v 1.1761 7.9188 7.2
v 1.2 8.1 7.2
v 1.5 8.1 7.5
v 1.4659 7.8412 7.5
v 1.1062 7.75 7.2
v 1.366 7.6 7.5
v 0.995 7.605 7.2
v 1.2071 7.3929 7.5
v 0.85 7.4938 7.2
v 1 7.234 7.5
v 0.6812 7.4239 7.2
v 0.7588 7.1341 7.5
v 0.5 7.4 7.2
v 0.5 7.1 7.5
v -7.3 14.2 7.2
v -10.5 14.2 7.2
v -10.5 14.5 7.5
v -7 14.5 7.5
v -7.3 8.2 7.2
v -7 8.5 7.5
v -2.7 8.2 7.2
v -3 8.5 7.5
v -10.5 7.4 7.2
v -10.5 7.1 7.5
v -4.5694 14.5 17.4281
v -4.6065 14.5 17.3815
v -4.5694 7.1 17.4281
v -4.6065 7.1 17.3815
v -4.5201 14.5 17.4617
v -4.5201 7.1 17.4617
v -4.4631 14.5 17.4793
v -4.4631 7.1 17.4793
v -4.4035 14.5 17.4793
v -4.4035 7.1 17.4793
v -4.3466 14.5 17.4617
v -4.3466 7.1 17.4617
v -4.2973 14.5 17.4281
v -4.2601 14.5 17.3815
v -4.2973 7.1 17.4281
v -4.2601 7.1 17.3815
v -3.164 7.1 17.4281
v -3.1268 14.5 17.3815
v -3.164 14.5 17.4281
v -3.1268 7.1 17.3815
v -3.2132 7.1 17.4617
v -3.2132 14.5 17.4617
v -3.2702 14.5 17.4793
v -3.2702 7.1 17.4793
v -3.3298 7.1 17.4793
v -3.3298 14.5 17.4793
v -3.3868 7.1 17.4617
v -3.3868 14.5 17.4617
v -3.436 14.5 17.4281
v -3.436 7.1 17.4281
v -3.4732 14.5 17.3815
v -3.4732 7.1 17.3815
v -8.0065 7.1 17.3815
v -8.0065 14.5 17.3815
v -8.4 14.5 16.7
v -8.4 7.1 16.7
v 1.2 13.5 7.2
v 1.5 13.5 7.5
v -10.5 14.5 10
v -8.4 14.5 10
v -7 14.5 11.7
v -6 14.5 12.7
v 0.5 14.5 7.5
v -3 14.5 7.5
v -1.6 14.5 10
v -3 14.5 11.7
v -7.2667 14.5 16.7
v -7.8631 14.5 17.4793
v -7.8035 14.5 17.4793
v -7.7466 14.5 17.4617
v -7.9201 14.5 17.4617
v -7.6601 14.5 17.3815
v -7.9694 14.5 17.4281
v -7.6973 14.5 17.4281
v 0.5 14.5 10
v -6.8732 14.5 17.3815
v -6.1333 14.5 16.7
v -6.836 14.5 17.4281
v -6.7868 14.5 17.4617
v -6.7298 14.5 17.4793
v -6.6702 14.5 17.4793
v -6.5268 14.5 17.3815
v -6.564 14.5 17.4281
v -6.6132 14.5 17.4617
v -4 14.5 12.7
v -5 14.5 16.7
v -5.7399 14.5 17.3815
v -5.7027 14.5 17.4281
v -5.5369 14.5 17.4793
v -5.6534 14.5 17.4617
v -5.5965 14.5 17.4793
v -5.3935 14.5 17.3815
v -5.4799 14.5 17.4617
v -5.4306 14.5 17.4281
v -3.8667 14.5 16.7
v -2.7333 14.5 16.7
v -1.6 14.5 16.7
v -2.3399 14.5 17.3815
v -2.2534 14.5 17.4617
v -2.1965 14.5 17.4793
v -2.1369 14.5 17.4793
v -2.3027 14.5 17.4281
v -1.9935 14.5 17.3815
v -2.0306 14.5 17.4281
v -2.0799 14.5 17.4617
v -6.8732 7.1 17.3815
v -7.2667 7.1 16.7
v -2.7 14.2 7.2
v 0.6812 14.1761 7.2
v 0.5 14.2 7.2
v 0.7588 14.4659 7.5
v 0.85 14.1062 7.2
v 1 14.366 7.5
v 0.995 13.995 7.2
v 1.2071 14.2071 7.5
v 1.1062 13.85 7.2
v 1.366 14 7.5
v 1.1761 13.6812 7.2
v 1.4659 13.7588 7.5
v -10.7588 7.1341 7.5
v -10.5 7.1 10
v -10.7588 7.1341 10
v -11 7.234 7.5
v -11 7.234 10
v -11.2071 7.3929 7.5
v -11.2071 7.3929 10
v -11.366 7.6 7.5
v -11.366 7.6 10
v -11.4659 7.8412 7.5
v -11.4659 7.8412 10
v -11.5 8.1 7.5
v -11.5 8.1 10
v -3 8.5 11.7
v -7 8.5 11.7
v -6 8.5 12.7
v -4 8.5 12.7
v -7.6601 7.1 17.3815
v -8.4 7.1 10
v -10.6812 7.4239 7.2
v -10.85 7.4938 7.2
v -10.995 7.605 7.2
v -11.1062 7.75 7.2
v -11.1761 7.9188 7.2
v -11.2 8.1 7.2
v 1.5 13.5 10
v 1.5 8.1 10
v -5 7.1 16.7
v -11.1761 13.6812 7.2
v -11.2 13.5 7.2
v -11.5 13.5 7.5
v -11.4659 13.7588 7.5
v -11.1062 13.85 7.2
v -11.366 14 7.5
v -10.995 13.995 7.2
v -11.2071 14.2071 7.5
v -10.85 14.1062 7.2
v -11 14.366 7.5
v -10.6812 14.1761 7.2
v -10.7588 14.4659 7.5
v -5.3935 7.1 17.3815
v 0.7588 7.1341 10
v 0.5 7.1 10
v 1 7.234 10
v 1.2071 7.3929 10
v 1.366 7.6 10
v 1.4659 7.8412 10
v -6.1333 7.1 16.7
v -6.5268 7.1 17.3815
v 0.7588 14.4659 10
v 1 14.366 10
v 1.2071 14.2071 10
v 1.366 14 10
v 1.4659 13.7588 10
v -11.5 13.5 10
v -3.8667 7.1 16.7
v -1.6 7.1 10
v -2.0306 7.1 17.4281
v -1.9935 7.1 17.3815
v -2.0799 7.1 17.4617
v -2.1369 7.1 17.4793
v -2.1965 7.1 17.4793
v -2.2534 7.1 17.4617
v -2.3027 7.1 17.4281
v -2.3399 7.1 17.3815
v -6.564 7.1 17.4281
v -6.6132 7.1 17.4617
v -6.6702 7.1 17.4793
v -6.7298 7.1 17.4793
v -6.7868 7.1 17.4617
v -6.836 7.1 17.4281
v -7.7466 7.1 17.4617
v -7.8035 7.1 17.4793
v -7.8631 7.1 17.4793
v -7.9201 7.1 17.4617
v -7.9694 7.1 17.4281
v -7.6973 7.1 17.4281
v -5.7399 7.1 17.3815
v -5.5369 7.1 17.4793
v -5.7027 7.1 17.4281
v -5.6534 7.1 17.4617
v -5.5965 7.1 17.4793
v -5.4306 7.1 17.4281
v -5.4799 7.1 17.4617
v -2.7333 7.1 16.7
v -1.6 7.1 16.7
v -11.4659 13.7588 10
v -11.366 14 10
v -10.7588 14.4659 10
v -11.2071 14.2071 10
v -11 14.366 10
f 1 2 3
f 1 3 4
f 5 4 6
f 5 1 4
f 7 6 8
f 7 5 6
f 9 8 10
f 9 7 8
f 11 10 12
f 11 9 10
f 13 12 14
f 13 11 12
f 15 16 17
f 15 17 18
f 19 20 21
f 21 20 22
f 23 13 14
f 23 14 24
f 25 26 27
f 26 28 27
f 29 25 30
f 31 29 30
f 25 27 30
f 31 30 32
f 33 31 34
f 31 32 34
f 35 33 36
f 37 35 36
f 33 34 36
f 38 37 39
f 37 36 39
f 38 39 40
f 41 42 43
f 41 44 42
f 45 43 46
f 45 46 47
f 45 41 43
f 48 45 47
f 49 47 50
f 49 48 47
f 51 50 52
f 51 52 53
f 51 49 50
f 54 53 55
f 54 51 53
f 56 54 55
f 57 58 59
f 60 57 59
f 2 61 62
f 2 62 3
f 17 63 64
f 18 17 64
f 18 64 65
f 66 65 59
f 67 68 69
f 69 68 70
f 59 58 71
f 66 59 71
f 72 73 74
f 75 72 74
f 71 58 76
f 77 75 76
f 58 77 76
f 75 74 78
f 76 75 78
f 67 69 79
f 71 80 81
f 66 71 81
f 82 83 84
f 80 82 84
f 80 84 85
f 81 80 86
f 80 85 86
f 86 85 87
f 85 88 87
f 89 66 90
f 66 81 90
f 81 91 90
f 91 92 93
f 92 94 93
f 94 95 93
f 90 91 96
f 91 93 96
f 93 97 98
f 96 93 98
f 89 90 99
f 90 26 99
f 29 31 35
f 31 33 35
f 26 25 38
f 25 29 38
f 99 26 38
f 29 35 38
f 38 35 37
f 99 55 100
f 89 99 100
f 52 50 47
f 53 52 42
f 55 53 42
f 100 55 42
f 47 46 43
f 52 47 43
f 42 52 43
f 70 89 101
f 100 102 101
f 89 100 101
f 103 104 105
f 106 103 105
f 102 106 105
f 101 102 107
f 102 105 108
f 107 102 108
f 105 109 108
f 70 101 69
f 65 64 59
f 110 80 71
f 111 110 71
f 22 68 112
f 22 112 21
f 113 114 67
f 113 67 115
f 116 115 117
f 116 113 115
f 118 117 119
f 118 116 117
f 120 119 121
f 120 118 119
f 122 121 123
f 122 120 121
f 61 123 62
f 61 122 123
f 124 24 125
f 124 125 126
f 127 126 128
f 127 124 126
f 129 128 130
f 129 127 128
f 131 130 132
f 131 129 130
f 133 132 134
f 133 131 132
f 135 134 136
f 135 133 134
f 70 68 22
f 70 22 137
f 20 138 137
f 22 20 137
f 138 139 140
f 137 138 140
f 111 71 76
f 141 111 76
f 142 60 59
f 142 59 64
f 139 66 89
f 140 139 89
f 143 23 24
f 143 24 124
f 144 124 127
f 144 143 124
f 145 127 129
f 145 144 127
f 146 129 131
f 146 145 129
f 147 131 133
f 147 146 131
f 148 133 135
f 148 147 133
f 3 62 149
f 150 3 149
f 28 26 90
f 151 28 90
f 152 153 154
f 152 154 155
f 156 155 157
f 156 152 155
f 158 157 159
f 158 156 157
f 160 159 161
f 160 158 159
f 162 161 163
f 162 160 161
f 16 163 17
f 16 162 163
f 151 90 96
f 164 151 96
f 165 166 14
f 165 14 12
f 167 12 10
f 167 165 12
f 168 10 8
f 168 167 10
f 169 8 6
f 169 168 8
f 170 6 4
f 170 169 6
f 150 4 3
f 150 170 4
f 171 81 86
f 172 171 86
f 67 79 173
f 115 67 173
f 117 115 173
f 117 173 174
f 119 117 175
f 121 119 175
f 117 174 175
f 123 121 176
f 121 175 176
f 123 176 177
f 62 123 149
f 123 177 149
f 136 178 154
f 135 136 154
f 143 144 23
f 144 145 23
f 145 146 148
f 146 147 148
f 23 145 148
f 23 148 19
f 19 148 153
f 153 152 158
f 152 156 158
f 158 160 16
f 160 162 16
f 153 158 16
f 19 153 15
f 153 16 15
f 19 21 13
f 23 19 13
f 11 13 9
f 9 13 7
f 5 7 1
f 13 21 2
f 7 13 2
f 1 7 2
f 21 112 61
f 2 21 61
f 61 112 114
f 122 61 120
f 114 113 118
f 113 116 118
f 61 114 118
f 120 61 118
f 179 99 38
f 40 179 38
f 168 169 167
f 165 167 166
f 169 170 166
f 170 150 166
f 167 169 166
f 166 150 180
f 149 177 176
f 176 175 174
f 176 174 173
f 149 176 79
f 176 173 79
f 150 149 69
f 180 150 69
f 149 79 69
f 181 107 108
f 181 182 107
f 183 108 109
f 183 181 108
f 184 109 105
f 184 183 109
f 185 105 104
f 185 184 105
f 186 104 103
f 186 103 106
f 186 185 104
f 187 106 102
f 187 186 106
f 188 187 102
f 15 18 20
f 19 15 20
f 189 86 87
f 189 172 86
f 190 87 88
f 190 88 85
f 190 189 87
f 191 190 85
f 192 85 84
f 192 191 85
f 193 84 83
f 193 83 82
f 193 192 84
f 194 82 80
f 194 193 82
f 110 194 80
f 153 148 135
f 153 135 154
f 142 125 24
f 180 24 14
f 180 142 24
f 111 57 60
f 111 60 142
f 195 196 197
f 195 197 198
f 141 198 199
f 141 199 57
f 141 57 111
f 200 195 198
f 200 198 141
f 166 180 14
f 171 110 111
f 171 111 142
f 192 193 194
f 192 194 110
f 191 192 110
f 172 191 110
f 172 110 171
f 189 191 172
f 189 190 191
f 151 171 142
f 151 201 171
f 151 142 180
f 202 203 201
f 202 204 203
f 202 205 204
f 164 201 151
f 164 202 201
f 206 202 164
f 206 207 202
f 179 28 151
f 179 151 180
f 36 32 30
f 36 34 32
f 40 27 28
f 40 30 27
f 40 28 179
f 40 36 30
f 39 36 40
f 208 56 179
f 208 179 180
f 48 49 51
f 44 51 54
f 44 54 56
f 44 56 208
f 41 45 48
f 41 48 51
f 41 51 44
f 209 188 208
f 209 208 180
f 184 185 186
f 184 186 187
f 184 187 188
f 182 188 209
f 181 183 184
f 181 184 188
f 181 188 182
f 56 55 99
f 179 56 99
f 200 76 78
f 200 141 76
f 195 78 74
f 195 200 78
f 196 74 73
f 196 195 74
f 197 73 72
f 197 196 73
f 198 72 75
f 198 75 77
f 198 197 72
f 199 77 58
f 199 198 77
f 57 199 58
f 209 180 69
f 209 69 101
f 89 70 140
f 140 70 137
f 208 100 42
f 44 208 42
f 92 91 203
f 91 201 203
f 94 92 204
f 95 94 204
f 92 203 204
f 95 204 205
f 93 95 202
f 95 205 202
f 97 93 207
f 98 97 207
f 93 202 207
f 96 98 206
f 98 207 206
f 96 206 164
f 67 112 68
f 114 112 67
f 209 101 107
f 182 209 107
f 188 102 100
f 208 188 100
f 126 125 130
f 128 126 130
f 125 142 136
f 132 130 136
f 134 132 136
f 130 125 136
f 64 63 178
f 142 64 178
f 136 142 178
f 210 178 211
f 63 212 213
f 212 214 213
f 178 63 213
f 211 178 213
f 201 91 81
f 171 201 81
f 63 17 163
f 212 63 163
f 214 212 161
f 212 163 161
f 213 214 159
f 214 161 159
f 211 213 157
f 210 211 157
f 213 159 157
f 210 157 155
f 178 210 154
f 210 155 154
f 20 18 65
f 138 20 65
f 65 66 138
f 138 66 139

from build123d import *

# Parameters (mm, degrees)
PAD_DEPTH           = 7.4
SKETCH095_W         = 4
SKETCH095_H         = 5.5
POCKET045_DEPTH     = 6
PAD048_DEPTH        = 7.4
LINEARPATTERN_COUNT = 6
LINEARPATTERN_PITCH = 1.133333
FILLET_R            = 0.2
FILLET034_R         = 1
CHAMFER028_SIZE     = 0.3
CHAMFER029_SIZE     = 1


with BuildPart() as part:
    # Sketch → Pad (new body)
    with BuildSketch(Plane.XZ):
        Polygon((-6.5, 0), (6.5, 0), (6.5, 2.8), (3.4, 2.8), (3.4, 9.5), (-3.4, 9.5), (-3.4, 2.8), (-6.5, 2.8), align=None)
    extrude(amount=PAD_DEPTH)

    # Sketch095 → Pocket045 (cut)
    with BuildSketch(Plane.XZ):
        with Locations((0, 2.75)):
            Rectangle(SKETCH095_W, SKETCH095_H)
    extrude(amount=POCKET045_DEPTH, mode=Mode.SUBTRACT)

    # Sketch096 → Pad048 (join)
    with BuildSketch(Plane.XZ):
        Polygon((-3.4, 9.5), (-2.266667, 9.5), (-2.833333, 10.481495), align=None)
    pad048 = extrude(amount=PAD048_DEPTH)

    # LinearPattern: Pad048 ×6
    with Locations(*[(i * LINEARPATTERN_PITCH, 0, 0) for i in range(1, LINEARPATTERN_COUNT)]):
        add(pad048)

    # Fillet
    fillet_edges = [part.edges().sort_by_distance(p)[0] for p in [
        (-2.833333, -3.7, 10.481495),
        (-1.7, -3.7, 10.481495),
        (-0.566667, -3.7, 10.481495),
        (0.566667, -3.7, 10.481495),
        (1.7, -3.7, 10.481495),
        (2.833334, -3.7, 10.481495),
    ]]
    fillet(fillet_edges, radius=FILLET_R)

    # Fillet034
    fillet034_edges = [part.edges().sort_by_distance(p)[0] for p in [
        (-6.5, 0, 1.4),
        (-6.5, -7.4, 1.4),
        (6.5, -7.4, 1.4),
        (6.5, 0, 1.4),
    ]]
    fillet(fillet034_edges, radius=FILLET034_R)

    # Chamfer028
    chamfer028_edges = [part.edges().sort_by_distance(p)[0] for p in [
        (-3.75, 0, 0),
        (-6.207107, -0.292893, 0),
        (-2, -3, 0),
        (-6.5, -3.7, 0),
        (0, -6, 0),
        (-6.207107, -7.107107, 0),
        (2, -3, 0),
        (0, -7.4, 0),
        (3.75, 0, 0),
        (6.207107, -7.107107, 0),
        (6.207107, -0.292893, 0),
        (6.5, -3.7, 0),
    ]]
    chamfer(chamfer028_edges, length=CHAMFER028_SIZE)

    # Chamfer029
    chamfer029_edges = [part.edges().sort_by_distance(p)[0] for p in [
        (2, -3, 5.5),
        (-2, -3, 5.5),
    ]]
    chamfer(chamfer029_edges, length=CHAMFER029_SIZE)


with BuildPart() as part_1:
    # Body placement: moved
    add(part.part.moved(Location((-5, 14.5, 7.2))))


solid = part_1.part
